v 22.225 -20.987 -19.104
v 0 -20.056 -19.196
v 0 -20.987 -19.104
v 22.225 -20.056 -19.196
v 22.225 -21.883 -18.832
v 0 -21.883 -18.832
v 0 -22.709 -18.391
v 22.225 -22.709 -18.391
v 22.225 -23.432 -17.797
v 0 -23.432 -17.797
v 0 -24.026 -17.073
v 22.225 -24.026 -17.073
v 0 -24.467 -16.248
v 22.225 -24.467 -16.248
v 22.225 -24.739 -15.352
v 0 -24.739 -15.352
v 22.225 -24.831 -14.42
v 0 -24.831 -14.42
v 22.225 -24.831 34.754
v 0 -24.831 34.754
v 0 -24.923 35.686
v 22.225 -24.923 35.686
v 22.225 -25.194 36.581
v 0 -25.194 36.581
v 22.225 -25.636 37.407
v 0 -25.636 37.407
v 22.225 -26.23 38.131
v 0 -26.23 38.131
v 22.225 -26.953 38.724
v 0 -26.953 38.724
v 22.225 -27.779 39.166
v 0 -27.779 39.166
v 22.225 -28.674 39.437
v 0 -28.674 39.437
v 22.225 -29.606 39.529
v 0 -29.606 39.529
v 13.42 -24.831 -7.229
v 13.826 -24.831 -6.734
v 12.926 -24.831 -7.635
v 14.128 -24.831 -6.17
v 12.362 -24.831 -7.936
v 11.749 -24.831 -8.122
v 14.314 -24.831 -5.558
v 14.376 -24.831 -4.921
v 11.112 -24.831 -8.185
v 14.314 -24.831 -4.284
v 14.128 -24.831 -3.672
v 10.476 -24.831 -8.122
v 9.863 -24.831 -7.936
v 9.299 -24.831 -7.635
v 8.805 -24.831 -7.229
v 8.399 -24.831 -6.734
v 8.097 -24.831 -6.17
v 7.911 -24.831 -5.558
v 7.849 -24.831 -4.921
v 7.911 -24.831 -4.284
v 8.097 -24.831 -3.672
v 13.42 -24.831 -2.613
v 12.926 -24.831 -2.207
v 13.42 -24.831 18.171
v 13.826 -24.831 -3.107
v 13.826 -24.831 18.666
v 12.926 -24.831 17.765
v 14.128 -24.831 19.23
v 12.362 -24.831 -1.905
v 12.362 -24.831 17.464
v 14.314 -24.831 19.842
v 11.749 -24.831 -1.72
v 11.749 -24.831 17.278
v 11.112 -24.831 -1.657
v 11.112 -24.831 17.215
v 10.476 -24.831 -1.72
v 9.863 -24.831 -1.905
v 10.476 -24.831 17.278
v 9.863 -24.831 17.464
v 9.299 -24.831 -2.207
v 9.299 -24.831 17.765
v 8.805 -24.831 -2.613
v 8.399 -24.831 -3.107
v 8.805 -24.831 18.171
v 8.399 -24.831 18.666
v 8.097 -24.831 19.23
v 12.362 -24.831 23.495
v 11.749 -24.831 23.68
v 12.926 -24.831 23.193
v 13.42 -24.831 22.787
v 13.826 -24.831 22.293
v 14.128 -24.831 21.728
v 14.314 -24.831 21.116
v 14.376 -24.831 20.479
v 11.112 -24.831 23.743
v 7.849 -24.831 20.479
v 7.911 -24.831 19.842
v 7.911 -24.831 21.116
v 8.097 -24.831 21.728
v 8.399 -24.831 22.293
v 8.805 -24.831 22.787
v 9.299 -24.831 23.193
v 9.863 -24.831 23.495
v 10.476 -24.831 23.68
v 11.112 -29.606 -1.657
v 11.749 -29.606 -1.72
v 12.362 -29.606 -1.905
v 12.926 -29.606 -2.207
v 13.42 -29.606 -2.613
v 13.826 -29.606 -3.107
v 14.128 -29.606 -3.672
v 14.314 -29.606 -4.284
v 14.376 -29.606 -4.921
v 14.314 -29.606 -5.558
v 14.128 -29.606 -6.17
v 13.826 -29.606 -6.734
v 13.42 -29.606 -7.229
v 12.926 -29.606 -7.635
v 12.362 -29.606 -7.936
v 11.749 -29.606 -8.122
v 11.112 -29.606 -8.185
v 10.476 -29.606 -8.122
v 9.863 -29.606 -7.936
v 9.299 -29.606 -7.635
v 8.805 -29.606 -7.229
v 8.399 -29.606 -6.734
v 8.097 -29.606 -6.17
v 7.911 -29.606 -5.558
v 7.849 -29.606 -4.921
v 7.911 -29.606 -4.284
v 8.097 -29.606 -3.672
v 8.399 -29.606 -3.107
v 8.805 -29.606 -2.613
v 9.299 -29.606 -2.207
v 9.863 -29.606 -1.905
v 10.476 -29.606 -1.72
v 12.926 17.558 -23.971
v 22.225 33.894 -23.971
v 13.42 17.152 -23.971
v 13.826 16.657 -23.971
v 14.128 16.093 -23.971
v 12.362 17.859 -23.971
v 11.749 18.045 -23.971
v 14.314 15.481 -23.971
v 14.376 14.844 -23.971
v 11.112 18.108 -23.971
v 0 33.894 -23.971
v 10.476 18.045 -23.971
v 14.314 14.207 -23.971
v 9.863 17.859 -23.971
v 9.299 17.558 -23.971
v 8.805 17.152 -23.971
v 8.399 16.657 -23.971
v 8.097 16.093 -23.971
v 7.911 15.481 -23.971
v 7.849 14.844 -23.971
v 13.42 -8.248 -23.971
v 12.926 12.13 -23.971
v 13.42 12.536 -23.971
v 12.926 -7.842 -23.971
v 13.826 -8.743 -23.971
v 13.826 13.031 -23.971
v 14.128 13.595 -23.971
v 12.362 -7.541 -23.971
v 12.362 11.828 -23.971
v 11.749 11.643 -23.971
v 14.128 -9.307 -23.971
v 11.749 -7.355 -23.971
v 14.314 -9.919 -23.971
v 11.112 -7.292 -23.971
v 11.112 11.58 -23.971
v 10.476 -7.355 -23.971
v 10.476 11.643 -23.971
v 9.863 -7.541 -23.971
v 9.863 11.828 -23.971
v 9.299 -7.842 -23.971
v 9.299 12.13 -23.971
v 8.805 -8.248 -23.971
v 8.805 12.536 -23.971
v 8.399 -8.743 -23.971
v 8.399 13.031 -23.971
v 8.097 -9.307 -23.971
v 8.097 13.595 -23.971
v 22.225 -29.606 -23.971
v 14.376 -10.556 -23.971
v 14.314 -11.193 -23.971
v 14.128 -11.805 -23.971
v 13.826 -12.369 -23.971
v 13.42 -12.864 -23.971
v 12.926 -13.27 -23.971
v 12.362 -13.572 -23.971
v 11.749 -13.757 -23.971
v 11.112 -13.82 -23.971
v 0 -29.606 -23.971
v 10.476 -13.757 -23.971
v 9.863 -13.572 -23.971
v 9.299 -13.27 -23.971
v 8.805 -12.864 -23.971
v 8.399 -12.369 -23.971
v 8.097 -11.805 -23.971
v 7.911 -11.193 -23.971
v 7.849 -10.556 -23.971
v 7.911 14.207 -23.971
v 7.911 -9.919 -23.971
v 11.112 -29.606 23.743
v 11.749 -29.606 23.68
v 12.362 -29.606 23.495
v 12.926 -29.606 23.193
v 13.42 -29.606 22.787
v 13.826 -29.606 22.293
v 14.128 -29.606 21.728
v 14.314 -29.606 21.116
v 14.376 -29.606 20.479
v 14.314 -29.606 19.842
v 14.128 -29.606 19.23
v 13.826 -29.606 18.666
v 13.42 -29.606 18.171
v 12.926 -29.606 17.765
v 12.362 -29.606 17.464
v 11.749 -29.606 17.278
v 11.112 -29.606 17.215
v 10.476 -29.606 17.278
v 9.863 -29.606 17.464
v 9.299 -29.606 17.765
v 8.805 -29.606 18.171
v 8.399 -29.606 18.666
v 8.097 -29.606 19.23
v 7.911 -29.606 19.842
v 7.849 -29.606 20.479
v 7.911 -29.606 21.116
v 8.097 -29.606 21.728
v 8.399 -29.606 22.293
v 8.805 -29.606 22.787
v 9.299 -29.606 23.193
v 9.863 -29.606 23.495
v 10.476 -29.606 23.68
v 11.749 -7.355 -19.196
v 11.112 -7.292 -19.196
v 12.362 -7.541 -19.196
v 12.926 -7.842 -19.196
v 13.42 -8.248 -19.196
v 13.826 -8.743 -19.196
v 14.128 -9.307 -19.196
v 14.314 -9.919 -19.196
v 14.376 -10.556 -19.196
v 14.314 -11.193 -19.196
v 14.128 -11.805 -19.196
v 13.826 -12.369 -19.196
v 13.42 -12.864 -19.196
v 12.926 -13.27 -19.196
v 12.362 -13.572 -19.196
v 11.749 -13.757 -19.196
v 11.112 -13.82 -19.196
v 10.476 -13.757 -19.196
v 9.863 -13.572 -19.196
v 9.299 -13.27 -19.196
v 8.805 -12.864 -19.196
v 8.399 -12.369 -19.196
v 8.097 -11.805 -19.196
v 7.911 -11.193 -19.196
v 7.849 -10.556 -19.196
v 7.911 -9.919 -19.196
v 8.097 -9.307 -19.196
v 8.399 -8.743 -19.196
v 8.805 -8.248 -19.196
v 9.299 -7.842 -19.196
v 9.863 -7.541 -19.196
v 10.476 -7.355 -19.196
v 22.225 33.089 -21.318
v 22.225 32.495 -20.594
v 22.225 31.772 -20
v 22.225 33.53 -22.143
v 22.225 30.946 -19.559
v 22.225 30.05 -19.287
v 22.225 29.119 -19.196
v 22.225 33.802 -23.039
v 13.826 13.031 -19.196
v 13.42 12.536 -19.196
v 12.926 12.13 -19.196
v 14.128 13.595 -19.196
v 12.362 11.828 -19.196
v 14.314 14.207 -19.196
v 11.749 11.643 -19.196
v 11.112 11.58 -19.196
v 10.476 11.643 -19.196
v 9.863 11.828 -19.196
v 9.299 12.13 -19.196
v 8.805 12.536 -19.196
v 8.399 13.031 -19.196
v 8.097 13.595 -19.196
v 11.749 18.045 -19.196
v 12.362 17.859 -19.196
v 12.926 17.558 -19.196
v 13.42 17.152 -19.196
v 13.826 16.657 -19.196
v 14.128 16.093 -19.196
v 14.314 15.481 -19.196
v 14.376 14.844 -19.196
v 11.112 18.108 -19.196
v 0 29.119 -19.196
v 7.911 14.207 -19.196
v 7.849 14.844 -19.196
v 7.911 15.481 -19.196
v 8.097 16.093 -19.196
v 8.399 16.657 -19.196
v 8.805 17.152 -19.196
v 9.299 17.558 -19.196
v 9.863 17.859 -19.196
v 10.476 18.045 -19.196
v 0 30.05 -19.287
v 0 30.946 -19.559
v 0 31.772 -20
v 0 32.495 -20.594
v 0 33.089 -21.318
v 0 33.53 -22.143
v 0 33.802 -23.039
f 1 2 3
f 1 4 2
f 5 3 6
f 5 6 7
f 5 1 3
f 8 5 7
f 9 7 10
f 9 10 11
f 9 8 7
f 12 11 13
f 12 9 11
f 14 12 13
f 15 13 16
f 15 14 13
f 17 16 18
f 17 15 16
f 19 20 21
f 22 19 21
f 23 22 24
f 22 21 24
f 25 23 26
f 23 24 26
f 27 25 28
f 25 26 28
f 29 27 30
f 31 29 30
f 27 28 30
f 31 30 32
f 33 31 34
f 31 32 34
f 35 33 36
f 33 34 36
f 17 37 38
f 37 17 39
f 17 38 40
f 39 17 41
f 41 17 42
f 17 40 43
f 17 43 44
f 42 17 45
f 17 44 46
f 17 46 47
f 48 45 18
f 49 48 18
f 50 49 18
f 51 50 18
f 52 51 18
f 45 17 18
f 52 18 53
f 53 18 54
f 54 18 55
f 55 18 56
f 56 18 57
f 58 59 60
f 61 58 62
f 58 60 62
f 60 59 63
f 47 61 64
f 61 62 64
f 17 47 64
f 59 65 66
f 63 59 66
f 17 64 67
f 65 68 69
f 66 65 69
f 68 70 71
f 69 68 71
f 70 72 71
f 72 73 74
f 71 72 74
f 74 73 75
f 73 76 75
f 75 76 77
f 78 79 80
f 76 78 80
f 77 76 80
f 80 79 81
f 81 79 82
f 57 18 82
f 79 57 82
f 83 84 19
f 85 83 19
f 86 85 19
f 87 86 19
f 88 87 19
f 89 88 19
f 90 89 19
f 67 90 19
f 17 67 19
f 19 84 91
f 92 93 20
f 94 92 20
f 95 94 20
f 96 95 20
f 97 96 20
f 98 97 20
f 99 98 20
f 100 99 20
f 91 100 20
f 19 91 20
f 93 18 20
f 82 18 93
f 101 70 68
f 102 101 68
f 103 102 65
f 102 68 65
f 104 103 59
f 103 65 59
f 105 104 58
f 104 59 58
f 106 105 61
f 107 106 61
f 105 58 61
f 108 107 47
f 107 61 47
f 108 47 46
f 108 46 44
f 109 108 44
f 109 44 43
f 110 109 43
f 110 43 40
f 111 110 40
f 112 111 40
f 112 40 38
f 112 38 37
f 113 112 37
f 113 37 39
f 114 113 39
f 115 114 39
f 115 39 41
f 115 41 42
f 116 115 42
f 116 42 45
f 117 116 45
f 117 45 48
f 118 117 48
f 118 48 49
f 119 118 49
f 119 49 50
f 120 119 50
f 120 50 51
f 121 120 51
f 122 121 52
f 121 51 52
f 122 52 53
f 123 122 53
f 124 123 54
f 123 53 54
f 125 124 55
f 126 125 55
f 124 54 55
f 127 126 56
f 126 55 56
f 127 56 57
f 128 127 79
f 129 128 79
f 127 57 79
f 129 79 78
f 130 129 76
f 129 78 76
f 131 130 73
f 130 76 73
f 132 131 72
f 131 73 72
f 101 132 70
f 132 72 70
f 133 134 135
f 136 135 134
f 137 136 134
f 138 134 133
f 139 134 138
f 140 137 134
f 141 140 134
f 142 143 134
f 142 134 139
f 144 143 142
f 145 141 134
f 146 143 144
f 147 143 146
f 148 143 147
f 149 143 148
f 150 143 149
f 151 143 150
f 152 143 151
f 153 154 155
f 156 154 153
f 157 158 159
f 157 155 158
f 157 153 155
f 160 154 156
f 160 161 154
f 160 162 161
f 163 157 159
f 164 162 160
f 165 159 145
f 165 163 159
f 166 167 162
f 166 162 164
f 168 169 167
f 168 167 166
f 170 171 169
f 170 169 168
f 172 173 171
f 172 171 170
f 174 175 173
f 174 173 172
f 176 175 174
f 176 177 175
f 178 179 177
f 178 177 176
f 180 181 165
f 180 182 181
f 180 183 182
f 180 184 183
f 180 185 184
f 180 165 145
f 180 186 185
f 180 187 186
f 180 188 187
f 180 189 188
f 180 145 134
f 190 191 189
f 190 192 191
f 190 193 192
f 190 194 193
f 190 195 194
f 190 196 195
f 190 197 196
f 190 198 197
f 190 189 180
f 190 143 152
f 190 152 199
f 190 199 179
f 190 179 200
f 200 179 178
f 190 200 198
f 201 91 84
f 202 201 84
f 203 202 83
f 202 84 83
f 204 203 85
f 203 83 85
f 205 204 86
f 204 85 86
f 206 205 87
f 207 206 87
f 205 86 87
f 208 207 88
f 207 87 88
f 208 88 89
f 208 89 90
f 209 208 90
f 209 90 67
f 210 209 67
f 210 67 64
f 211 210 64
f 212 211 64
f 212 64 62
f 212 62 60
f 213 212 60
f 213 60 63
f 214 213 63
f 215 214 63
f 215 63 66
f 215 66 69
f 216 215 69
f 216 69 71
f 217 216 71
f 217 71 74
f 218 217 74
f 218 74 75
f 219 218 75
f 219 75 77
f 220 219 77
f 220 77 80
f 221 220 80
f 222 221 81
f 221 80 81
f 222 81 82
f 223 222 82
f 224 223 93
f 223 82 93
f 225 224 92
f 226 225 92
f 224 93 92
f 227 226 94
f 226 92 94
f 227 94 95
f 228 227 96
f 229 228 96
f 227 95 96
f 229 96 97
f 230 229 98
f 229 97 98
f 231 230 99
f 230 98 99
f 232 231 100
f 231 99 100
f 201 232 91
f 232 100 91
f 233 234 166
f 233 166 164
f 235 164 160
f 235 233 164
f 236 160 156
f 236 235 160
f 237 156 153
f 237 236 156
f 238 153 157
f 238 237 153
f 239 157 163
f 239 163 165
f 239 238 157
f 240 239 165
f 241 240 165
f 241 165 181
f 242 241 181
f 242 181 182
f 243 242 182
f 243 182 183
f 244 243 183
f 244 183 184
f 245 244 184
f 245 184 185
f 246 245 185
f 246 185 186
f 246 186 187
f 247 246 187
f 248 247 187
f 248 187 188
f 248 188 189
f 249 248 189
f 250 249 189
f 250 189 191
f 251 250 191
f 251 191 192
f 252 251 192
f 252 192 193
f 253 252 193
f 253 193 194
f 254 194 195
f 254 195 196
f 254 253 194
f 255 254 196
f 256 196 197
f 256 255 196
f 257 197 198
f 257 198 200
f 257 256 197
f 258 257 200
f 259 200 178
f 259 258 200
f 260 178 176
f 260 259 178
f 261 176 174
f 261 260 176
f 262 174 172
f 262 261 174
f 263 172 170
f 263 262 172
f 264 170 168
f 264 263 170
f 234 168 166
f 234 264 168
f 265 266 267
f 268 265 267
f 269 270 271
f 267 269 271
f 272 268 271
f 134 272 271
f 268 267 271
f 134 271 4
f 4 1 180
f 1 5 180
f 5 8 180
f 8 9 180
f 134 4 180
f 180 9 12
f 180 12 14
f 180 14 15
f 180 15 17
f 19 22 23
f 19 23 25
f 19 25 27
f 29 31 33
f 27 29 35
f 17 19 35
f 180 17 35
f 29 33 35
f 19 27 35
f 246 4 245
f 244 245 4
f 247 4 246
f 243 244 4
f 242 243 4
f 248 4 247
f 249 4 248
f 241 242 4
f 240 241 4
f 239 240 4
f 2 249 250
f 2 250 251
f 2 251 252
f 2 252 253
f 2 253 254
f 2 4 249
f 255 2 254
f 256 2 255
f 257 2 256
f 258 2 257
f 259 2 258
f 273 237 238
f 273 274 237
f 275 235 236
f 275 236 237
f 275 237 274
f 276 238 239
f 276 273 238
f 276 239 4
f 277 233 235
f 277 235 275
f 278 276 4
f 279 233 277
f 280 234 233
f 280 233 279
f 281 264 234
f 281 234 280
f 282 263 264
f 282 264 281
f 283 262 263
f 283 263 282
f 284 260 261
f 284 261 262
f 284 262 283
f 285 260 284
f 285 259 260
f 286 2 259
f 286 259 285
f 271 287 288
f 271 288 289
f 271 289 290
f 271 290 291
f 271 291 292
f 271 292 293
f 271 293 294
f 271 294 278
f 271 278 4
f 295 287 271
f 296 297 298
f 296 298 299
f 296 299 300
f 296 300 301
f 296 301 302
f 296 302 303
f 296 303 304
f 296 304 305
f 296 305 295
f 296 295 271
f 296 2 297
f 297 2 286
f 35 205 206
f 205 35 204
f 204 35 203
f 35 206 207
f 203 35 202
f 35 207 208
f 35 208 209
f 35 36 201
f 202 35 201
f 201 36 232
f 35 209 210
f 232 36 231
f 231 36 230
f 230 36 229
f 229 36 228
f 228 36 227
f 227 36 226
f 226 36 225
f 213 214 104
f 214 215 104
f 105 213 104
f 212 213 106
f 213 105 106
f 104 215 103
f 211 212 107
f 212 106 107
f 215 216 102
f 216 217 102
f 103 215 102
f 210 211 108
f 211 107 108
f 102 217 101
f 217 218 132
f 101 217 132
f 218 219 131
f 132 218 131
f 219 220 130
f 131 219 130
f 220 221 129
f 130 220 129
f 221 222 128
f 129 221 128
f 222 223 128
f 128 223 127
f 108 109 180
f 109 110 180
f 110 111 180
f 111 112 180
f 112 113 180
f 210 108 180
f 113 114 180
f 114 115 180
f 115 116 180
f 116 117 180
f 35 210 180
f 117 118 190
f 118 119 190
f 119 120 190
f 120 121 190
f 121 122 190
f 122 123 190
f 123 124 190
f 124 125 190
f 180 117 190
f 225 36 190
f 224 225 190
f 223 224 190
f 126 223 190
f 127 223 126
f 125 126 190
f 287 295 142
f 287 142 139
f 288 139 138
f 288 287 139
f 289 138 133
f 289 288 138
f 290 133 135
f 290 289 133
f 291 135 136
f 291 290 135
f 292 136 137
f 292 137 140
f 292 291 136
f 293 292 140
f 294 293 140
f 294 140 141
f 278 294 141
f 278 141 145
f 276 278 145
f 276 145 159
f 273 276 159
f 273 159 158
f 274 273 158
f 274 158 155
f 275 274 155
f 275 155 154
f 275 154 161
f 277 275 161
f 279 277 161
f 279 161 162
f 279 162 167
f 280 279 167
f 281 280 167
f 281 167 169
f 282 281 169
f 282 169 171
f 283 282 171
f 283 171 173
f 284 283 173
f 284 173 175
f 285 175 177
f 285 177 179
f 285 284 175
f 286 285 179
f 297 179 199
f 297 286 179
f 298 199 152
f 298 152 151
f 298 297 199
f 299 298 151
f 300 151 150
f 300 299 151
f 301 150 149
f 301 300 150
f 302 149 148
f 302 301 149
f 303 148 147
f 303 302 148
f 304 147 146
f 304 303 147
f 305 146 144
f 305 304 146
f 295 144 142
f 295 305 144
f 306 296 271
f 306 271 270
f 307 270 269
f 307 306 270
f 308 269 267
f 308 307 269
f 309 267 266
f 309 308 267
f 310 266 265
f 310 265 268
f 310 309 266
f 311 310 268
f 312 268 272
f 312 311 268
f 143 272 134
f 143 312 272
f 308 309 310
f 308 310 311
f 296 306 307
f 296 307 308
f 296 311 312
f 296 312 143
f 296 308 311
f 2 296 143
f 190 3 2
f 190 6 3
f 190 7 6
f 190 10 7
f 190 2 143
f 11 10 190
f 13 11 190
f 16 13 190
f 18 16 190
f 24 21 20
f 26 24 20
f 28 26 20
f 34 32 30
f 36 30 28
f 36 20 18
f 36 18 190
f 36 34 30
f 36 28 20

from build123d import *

# Parameters (mm, degrees)
EXTRUDE1_DEPTH     = 22.225
SKETCH2_R          = 3.2639
CUT_EXTRUDE1_DEPTH = 22.225
FILLET1_R          = 4.7752


with BuildPart() as part:
    # Sketch1 → Extrude1 (new body)
    with BuildSketch(Plane(origin=(0, 0, 0), x_dir=(0, 0, -1), z_dir=(1, 0, 0))):
        with BuildLine():
            Line((23.97075862, -29.606090317), (19.19555862, -24.830890317))
            Line((19.19555862, -24.830890317), (-34.75404138, -24.830890317))
            ThreePointArc((-34.75404138, -24.830890317), (-38.130617682, -26.229514015), (-39.52924138, -29.606090317))
            Line((-39.52924138, -29.606090317), (23.97075862, -29.606090317))
        make_face()
    extrude(amount=EXTRUDE1_DEPTH)

    # Sketch2 → Cut-Extrude1 (cut)
    with BuildSketch(Plane(origin=(0, -24.830890317, 0), x_dir=(1, 0, 0), z_dir=(0, 1, 0))):
        with Locations(Location((11.1125, -20.47924138, 0), (0, 0, 270))):  # turned: the seam where the file's is
            Circle(SKETCH2_R)
        with Locations(Location((11.1125, 4.92075862, 0), (0, 0, 270))):  # turned: the seam where the file's is
            Circle(SKETCH2_R)
    extrude(amount=-CUT_EXTRUDE1_DEPTH, mode=Mode.SUBTRACT)

    # Mirror1: part across plane


with BuildPart() as part_1:
    add(part.part)
    add(part.part.mirror(Plane(origin=(22.225, -29.606090317, -23.97075862), x_dir=(0, 0.707106781, 0.707106781), z_dir=(0, -0.707106781, 0.707106781))))

    # Fillet1
    fillet1_edges = [part_1.edges().sort_by_distance(p)[0] for p in [
        (11.1125, -24.830890317, -19.19555862),
    ]]
    fillet(fillet1_edges, radius=FILLET1_R)


solid = part_1.part
